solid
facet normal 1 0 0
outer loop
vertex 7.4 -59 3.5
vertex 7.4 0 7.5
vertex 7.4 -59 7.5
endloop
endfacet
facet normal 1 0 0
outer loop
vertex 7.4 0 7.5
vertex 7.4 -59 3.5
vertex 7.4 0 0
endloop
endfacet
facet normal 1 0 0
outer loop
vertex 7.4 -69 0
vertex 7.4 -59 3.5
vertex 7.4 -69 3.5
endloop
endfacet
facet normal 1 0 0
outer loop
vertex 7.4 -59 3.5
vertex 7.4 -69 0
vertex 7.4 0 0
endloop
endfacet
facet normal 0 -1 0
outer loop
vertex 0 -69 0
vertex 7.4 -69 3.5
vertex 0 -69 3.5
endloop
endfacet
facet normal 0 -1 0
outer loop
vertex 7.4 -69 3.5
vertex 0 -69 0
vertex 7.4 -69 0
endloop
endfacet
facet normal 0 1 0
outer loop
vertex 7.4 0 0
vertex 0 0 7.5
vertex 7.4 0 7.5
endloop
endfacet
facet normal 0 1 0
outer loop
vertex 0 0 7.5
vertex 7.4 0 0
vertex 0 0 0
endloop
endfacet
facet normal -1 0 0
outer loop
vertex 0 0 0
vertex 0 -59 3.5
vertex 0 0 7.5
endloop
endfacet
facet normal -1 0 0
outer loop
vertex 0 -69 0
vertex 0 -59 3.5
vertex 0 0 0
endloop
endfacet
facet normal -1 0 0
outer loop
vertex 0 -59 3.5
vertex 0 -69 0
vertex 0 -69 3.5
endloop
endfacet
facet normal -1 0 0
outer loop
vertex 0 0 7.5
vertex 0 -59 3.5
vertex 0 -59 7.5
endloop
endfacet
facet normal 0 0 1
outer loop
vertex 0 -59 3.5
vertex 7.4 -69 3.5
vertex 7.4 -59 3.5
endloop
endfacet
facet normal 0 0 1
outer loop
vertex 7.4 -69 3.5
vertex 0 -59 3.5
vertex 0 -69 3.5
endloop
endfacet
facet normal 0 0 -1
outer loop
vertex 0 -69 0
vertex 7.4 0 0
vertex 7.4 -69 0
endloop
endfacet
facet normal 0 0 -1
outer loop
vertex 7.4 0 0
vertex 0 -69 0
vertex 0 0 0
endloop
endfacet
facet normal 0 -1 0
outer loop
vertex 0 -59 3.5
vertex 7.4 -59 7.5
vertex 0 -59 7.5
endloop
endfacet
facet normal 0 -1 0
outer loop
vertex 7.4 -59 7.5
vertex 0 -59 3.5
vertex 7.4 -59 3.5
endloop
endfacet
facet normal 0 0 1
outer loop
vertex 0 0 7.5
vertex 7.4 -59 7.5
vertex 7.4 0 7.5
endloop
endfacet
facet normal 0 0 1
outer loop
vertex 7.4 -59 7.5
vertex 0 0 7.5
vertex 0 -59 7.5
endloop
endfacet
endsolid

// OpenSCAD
module A_TerminalPlateSlot() {
  RADIUS_TO_WIDTH=1/sqrt(2);
  
  rotate([0,0,45])
  cylinder($fn=4,r1=12.8*RADIUS_TO_WIDTH, r2=11*RADIUS_TO_WIDTH, h=1.5);
}

module A1_SquareProtrusion() {
  BLOCK_SIZE=[14,14,80];
  CUTOUT=[7.6,50,15.8];

  difference() {
    translate([0,0,BLOCK_SIZE[2]*.5])
    translate(BLOCK_SIZE*-.5)
      cube(BLOCK_SIZE);

    translate([0,-1,80-12])
    rotate([0,0,90])
    translate(CUTOUT*-.5)
    cube(CUTOUT);
  }
}

module B_BatteryHolder() {
  difference() {
    union(){     
      cylinder(r=28/2, h=80, $fn=6);

      translate([0,-19,0])
        A1_SquareProtrusion();
    }
    
    // Battery cavity
    translate([0,0,5])
    hull() {
      translate([0,8,0])
        cylinder(r=18.15/2, h=70,$fn=32);
        
      cylinder(r=18.6/2,h=70,$fn=32);
    }
  
    TERMINAL_HOLE_SIZE = [3.5,20,2.4];
    
    // negative terminal slot    
    translate([0,-10,3.6])
    translate(TERMINAL_HOLE_SIZE*-.5)
      cube(TERMINAL_HOLE_SIZE);

    translate([0,8,3.6])
      A_TerminalPlateSlot();

    translate([0,-1,3.6])
      A_TerminalPlateSlot();


    // positive terminal slot
    translate([0,-10,80-(3.6+1.5)])
    translate(TERMINAL_HOLE_SIZE*-.5)
      cube(TERMINAL_HOLE_SIZE);
    
    translate([0,8,80-3.6])
      rotate([180,0,0])
      A_TerminalPlateSlot();
    
    translate([0,-1,80-3.6])
      rotate([180,0,0])
      A_TerminalPlateSlot();


    translate([-2,-23.8,4])
    cube([10,7.6,60]);
  }
}


// B_BatteryHolder();

module C_WireSlotFiller() {
  union() {  
    cube([7.4,3.5,69]);

    translate([0,3.5,0])
      cube([7.4,4,59]);
  }
}

rotate([90,0,0])
C_WireSlotFiller();
